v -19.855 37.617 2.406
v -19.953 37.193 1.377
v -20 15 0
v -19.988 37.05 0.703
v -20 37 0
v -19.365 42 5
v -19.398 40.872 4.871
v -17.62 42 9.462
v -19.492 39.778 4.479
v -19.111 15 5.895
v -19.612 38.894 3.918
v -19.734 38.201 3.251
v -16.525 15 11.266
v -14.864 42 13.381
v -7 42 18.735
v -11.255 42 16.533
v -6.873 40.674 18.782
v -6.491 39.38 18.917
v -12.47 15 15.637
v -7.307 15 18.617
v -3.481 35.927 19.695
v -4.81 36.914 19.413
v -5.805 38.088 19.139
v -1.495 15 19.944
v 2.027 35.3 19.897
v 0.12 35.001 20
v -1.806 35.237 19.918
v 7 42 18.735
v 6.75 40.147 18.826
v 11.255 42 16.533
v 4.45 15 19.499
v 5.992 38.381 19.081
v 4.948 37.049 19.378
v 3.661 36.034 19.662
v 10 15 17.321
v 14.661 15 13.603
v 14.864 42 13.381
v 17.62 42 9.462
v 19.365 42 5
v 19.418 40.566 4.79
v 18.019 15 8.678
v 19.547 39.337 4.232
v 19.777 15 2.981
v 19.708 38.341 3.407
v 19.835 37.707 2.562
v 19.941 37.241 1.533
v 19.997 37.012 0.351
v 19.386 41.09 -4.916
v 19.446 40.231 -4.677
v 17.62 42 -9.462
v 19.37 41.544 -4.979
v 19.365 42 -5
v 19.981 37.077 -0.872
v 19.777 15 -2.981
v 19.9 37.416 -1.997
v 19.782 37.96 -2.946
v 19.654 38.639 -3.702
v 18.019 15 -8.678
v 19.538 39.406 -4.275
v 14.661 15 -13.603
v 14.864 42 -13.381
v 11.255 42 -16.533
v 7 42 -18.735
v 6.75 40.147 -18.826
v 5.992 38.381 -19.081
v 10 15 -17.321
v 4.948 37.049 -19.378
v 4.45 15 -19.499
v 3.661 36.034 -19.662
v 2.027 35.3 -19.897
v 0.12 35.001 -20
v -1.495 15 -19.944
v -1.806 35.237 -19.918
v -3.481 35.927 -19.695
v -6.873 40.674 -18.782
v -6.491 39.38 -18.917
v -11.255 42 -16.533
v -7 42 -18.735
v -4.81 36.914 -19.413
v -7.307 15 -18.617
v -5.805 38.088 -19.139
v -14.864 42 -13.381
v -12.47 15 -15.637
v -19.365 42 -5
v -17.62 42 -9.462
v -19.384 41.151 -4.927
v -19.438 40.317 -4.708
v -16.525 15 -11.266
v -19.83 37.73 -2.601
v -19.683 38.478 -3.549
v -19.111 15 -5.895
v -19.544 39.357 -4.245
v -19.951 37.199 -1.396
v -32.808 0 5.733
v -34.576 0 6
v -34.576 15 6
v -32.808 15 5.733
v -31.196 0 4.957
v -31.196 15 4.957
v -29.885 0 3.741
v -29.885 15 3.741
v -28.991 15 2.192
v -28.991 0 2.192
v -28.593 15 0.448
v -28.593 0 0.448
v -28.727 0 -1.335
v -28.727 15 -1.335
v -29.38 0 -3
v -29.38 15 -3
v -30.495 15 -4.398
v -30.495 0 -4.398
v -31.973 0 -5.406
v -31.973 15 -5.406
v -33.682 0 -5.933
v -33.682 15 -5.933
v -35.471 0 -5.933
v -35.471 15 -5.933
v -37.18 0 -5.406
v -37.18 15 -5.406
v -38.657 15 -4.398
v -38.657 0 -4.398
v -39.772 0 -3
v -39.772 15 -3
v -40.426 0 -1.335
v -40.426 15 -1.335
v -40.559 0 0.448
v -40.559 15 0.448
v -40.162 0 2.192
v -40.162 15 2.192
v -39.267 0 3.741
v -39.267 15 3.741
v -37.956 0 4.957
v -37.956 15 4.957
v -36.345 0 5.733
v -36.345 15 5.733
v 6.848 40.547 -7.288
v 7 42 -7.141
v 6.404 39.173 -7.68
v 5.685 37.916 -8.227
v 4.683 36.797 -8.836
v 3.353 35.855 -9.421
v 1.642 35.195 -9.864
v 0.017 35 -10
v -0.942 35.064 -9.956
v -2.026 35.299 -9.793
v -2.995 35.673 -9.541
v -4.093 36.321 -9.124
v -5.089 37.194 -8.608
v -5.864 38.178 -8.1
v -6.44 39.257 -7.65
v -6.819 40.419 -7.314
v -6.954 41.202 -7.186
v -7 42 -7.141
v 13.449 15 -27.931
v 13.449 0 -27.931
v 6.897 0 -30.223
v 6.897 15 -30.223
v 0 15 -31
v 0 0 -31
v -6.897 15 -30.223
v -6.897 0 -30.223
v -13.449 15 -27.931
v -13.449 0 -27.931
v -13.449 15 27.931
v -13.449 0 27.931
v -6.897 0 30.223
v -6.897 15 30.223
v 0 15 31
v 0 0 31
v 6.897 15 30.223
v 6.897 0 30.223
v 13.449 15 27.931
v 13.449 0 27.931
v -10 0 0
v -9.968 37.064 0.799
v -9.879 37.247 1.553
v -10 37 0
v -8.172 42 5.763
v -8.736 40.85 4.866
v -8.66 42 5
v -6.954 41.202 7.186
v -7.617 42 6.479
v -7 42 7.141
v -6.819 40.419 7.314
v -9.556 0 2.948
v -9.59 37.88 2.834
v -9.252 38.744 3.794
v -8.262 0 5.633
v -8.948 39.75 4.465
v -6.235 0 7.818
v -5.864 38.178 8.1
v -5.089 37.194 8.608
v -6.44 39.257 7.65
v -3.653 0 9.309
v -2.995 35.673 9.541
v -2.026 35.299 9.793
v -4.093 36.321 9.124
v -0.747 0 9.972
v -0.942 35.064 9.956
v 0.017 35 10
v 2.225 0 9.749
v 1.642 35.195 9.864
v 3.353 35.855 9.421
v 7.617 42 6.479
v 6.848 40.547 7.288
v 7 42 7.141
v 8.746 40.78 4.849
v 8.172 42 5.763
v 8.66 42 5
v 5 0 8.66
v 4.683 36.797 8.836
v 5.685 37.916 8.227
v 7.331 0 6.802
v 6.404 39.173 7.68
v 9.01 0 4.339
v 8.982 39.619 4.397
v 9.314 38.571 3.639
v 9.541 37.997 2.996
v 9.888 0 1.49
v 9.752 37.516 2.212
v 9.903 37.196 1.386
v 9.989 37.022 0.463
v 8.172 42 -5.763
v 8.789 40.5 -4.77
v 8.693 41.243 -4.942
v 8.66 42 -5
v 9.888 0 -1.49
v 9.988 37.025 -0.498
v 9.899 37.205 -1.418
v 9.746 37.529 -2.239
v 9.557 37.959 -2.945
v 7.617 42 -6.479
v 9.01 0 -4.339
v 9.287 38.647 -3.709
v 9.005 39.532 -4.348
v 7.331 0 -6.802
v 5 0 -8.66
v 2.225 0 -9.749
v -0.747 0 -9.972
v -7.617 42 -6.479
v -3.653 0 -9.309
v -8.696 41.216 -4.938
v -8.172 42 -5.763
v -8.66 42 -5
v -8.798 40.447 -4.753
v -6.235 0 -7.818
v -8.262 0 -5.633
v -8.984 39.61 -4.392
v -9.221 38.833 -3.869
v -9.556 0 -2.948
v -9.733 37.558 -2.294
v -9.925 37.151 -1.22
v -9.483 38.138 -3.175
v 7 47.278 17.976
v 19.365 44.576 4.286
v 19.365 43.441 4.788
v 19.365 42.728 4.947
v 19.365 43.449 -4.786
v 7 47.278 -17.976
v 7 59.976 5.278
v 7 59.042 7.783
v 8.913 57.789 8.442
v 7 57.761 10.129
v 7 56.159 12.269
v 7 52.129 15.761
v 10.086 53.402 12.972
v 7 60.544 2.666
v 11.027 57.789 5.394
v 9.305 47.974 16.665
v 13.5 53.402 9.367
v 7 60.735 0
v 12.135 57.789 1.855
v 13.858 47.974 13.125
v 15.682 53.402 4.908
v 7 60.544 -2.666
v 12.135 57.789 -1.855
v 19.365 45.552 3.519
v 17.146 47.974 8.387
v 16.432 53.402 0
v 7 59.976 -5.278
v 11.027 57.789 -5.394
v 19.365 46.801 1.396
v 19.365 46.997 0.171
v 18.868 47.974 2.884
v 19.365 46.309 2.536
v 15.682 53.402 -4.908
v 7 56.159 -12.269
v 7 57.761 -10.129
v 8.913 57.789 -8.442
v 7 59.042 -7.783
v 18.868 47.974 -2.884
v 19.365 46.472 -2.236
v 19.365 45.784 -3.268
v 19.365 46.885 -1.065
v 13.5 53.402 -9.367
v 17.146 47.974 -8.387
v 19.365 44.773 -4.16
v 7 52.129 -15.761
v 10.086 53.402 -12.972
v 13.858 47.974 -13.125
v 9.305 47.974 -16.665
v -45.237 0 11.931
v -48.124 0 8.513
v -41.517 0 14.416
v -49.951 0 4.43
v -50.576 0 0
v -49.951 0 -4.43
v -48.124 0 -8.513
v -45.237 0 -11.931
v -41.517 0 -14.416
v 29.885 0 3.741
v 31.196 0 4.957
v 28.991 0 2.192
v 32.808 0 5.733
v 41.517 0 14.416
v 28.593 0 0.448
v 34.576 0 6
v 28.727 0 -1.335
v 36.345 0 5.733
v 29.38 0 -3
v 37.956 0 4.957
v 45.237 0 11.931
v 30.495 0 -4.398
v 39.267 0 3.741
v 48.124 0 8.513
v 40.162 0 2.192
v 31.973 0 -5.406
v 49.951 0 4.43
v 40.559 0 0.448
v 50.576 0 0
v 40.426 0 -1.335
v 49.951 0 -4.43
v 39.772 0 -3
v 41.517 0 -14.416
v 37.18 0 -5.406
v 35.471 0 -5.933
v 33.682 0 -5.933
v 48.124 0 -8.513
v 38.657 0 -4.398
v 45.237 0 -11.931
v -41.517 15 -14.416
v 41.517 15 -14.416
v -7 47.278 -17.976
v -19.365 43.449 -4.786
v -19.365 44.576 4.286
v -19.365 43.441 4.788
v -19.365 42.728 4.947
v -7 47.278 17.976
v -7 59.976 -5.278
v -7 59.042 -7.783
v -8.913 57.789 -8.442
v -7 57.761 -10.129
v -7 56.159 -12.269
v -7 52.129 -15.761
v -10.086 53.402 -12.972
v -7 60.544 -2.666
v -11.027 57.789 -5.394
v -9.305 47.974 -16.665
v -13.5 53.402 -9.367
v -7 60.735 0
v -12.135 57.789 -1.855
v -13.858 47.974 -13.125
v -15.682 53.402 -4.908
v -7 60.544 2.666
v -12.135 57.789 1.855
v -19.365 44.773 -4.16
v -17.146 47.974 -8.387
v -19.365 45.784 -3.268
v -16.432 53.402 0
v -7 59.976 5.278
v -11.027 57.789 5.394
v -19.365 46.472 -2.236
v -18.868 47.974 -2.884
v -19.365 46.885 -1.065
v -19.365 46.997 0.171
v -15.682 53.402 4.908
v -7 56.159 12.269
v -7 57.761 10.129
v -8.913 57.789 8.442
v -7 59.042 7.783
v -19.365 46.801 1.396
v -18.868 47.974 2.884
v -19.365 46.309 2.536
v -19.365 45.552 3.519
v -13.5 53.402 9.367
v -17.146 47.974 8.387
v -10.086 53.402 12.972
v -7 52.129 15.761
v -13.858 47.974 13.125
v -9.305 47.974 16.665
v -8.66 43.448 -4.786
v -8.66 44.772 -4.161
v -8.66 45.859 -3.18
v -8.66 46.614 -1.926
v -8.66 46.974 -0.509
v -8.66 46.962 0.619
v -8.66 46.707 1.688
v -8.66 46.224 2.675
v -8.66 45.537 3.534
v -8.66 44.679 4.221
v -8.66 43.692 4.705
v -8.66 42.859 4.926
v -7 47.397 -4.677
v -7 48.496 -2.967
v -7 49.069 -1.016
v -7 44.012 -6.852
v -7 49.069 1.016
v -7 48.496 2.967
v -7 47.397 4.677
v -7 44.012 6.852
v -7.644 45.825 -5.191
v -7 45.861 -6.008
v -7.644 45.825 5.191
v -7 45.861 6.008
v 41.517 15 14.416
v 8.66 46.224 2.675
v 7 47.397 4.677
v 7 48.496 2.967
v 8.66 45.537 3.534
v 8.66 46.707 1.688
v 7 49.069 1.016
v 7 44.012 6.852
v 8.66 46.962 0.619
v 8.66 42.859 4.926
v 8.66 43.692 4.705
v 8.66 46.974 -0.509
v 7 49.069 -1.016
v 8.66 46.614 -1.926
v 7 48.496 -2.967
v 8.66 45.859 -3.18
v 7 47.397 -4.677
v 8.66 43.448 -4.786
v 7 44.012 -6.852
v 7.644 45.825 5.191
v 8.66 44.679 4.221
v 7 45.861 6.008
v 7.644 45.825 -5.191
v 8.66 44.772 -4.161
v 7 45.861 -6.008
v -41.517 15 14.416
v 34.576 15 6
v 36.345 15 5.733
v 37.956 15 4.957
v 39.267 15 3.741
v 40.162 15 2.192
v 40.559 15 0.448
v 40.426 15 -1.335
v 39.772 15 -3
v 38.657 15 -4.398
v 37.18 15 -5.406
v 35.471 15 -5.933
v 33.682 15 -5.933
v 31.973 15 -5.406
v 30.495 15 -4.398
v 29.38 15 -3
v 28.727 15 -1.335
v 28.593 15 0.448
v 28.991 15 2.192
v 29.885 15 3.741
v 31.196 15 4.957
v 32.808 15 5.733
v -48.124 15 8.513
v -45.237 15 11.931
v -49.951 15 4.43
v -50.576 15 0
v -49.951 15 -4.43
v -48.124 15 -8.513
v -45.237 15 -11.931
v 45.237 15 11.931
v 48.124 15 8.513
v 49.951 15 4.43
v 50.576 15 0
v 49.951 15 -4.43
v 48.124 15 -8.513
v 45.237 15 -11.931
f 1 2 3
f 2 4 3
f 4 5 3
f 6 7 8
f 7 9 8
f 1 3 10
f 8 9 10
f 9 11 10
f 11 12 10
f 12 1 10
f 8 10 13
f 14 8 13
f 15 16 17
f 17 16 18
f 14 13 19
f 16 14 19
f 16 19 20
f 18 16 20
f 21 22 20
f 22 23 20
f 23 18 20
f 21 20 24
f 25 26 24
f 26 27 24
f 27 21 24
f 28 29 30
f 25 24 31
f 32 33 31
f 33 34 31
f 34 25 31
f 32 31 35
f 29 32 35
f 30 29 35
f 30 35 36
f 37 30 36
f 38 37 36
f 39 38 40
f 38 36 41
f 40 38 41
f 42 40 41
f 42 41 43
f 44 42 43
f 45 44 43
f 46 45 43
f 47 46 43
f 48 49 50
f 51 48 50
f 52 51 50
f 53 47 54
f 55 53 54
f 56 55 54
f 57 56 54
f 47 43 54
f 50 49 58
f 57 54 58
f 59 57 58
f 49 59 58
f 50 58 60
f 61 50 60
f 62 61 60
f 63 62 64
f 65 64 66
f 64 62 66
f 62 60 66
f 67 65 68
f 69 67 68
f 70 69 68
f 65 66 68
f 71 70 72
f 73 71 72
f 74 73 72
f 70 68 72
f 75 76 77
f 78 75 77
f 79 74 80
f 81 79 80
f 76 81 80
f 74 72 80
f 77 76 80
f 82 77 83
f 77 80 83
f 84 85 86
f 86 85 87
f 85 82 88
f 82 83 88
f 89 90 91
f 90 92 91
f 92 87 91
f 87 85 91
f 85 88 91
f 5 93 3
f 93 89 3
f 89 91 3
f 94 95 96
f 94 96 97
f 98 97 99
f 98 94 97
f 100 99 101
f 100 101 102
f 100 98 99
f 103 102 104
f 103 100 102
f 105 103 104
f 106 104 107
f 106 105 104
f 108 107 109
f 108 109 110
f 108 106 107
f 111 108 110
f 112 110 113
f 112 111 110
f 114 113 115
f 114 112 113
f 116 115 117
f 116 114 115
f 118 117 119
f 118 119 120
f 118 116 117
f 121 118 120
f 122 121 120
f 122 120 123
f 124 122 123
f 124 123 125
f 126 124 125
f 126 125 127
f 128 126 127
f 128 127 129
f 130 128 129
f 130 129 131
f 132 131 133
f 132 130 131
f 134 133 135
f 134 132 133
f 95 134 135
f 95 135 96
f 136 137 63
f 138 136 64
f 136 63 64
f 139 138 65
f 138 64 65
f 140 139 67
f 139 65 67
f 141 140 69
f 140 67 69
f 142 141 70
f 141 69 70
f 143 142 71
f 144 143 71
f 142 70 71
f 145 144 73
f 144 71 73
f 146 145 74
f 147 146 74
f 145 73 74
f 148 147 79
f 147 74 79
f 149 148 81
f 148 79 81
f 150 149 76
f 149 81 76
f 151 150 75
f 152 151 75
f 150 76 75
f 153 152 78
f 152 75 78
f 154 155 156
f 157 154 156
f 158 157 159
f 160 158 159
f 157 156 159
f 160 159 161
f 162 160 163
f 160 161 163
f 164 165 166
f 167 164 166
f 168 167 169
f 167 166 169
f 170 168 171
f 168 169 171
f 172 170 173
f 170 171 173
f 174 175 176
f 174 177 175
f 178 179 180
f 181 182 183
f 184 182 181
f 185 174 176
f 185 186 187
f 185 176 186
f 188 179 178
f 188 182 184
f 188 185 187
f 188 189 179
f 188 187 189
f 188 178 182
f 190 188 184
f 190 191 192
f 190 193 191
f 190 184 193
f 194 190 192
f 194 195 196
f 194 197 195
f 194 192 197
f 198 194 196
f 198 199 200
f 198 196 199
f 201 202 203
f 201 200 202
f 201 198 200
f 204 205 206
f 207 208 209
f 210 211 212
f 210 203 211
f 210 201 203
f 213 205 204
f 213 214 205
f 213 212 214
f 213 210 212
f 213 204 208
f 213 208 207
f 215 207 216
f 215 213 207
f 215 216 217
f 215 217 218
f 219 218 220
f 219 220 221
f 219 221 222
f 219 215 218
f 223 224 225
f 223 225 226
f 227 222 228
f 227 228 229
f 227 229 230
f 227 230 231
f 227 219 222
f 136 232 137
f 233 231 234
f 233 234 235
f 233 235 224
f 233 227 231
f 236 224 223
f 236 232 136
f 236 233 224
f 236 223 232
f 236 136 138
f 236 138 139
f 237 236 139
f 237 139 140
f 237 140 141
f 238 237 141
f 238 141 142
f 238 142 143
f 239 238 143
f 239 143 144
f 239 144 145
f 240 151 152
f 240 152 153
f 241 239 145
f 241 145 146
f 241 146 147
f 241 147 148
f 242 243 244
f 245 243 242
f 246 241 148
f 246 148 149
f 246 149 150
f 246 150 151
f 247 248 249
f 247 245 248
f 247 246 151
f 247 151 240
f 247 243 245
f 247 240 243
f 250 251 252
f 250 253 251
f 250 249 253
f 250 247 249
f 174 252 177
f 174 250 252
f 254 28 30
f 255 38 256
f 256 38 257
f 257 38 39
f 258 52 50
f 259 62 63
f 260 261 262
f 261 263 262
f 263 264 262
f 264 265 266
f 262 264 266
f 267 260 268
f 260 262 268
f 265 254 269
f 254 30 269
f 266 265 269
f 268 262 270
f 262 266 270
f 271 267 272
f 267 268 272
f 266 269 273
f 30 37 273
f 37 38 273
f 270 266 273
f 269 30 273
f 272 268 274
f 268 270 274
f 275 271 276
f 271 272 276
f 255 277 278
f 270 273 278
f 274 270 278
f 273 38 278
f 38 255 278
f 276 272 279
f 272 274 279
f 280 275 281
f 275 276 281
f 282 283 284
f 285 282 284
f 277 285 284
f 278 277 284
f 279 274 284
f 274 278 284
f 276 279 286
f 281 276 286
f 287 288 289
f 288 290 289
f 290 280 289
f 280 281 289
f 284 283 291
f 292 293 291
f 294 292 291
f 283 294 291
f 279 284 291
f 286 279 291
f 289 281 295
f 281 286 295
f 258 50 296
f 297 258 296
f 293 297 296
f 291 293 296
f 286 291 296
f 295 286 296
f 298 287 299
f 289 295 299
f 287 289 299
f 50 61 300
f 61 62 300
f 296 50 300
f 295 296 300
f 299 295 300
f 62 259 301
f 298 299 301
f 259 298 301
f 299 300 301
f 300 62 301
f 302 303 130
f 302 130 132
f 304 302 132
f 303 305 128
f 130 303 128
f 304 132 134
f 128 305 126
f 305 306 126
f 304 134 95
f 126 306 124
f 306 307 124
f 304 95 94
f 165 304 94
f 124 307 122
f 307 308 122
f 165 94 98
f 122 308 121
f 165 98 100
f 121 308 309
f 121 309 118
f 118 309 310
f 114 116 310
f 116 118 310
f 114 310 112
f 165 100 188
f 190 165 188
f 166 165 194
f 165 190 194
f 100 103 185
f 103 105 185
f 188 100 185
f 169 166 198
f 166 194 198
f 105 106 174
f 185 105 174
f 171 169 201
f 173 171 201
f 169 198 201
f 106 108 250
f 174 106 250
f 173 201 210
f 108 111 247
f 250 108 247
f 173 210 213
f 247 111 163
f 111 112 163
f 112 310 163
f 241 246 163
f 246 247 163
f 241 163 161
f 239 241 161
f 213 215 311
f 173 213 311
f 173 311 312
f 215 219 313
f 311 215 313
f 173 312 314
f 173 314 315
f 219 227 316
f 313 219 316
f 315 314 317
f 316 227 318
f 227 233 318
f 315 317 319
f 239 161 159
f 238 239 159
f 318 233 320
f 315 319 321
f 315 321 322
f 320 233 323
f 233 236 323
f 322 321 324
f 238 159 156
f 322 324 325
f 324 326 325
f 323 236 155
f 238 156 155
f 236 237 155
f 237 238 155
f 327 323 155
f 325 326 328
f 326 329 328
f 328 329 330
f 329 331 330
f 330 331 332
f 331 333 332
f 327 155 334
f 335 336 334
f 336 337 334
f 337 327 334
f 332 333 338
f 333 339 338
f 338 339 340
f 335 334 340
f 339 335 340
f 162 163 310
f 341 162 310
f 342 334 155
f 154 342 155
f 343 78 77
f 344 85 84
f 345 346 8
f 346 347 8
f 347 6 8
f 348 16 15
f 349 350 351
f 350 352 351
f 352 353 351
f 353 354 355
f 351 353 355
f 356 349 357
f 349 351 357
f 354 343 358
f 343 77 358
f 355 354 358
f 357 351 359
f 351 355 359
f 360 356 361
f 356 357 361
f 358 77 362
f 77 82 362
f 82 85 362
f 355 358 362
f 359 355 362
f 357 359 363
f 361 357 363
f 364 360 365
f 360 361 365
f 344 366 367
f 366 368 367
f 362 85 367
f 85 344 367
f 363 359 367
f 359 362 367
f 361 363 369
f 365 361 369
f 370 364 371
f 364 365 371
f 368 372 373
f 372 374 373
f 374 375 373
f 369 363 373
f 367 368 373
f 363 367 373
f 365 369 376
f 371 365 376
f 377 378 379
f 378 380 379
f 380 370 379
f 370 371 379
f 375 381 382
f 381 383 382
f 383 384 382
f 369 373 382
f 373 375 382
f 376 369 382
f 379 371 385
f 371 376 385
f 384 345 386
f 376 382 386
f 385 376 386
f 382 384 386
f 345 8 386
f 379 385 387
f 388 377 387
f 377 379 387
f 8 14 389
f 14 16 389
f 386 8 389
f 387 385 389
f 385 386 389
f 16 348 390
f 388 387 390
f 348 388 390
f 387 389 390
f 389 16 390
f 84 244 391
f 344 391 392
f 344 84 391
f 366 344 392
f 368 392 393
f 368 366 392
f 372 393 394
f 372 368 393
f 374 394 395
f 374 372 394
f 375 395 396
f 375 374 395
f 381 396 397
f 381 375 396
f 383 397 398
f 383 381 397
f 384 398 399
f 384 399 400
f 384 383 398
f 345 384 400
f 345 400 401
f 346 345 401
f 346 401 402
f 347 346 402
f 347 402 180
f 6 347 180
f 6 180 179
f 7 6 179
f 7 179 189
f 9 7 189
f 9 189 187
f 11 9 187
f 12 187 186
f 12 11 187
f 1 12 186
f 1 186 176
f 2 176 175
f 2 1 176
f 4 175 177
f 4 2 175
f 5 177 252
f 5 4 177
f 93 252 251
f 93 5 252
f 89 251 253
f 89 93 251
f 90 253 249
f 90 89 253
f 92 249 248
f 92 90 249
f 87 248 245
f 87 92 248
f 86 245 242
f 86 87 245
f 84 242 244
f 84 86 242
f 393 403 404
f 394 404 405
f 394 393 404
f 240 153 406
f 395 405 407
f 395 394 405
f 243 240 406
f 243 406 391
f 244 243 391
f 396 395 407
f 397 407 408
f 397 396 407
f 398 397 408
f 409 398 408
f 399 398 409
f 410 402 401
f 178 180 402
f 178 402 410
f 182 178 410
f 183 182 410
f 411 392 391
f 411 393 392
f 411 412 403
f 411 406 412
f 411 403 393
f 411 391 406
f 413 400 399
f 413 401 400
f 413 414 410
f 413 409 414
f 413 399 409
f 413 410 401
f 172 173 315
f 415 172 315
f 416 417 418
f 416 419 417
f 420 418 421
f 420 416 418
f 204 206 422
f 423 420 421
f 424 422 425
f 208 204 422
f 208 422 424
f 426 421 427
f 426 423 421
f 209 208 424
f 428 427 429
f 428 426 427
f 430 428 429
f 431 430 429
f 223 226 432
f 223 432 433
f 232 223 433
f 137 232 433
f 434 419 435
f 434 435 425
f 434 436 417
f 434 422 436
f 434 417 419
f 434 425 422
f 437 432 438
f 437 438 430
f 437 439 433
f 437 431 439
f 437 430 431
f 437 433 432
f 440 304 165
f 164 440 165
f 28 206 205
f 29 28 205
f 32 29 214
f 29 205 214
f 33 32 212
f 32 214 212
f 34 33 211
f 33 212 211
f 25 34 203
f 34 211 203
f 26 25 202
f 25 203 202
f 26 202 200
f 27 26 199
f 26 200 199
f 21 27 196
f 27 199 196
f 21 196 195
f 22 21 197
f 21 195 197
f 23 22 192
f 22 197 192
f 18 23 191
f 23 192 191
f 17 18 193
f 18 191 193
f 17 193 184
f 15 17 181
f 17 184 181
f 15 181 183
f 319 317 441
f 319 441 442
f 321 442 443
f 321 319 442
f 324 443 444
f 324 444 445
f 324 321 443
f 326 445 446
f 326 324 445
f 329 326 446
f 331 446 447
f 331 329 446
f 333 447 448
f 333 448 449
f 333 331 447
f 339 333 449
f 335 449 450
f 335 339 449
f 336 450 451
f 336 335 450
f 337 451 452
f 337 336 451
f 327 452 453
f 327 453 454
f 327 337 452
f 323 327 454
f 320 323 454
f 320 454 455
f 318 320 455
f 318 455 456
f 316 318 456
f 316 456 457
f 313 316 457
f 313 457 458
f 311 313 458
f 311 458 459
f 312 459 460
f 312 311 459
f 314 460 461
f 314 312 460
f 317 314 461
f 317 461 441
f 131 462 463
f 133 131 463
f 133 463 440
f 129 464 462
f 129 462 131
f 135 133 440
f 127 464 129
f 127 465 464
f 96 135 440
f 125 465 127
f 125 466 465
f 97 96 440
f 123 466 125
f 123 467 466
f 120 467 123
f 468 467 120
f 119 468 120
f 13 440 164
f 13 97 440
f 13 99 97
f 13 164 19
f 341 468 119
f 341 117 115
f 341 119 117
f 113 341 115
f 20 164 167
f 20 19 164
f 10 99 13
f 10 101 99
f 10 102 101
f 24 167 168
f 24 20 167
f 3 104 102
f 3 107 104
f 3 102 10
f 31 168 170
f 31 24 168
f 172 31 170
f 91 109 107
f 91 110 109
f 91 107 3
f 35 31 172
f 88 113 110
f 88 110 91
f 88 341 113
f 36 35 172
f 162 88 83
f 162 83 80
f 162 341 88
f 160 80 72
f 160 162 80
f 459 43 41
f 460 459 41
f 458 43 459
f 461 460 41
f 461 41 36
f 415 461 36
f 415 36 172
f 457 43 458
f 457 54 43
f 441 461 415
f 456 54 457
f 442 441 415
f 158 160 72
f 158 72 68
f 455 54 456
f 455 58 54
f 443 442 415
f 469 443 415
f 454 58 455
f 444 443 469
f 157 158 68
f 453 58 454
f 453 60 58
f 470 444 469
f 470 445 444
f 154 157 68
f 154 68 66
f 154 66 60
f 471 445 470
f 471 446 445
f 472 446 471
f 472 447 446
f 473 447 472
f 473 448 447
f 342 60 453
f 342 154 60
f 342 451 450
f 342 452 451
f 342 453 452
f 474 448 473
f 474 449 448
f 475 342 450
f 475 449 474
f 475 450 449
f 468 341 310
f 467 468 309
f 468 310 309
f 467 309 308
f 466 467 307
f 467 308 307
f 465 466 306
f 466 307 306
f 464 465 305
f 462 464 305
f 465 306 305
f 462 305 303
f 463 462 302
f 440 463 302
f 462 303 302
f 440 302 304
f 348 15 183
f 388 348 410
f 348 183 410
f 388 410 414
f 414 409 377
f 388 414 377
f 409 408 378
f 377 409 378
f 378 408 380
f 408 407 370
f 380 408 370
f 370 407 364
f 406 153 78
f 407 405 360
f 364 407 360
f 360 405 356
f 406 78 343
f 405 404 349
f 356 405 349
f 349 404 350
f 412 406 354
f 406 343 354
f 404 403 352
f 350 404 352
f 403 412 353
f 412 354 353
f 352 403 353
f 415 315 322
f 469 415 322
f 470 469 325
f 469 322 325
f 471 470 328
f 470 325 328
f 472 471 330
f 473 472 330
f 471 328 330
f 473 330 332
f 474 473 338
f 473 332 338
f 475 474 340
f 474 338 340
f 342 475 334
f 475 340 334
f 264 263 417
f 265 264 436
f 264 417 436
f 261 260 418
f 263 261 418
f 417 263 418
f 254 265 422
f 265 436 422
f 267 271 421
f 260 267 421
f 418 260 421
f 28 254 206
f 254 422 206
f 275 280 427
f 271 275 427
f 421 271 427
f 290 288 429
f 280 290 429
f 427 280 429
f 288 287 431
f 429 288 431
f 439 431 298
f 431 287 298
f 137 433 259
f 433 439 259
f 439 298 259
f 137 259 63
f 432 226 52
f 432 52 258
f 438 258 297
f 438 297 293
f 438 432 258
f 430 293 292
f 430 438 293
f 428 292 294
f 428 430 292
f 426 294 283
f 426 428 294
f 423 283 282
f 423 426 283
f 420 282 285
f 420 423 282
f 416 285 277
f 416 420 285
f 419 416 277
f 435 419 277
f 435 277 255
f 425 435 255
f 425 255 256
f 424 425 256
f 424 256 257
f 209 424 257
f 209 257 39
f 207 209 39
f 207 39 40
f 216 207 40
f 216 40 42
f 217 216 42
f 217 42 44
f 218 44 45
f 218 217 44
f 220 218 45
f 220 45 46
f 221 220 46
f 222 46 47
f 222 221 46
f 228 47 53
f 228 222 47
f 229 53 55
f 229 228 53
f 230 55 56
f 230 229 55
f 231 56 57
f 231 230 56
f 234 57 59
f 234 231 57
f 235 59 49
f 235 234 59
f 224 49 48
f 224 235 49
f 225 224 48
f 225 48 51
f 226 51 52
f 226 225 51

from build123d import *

# Parameters (mm, degrees)
SKETCH1_R               = 6.000000000045659
SKETCH1_R_2             = 6.000000000000002
BOSS_EXTRUDE3_DEPTH     = 15
CUT_EXTRUDE1_DEPTH      = 86.80768734285536
CUT_EXTRUDE1_DEPTH_BACK = 86.80768734285536
CUT_EXTRUDE2_DEPTH      = 85.89816666292398
CUT_EXTRUDE2_DEPTH_BACK = 85.89816666292398
SKETCH8_R               = 4.999999999999999


with BuildPart() as part:
    # Sketch1 → Boss-Extrude3 (new body)
    with BuildSketch(Plane(origin=(0, 0, 0), x_dir=(1, 0, 0), z_dir=(0, 1, 0))):
        with BuildLine():
            Line((13.448529411746133, -27.930933687605208), (41.51744765706708, -14.415965774247848))
            ThreePointArc((41.51744765706708, -14.415965774247848), (50.57627118648844, 3.55e-15), (41.51744765706708, 14.415965774247855))
            Line((41.51744765706708, 14.415965774247855), (13.448529411746131, 27.930933687605208))
            ThreePointArc((13.448529411746131, 27.930933687605208), (1.9e-15, 31.000000000000004), (-13.448529411746135, 27.930933687605208))
            Line((-13.448529411746135, 27.930933687605208), (-41.51744765706708, 14.415965774247852))
            ThreePointArc((-41.51744765706708, 14.415965774247852), (-50.576271186488434, 1.96e-15), (-41.51744765706708, -14.415965774247852))
            Line((-41.51744765706708, -14.415965774247852), (-13.448529411746136, -27.93093368760521))
            ThreePointArc((-13.448529411746136, -27.93093368760521), (1.9e-15, -31.000000000000007), (13.448529411746133, -27.930933687605208))
        make_face()
        with Locations(Location((-34.57627118648843, 0, 0), (0, 0, 270))):
            Circle(SKETCH1_R, mode=Mode.SUBTRACT)
        with Locations(Location((34.57627118648844, 0, 0), (0, 0, 270))):
            Circle(SKETCH1_R_2, mode=Mode.SUBTRACT)
    extrude(amount=BOSS_EXTRUDE3_DEPTH)

    # Sketch5 → Revolve1 (revolve)
    with BuildSketch(Plane.XY):
        with BuildLine():
            Line((0, 0), (0, 42))
            Line((0, 42), (-6.983e-14, 62.00000000000001))
            ThreePointArc((-6.983e-14, 62.00000000000001), (-14.14213562373098, 56.14213562373093), (-20, 42))
            Line((-20, 42), (-19.999999999999996, 0))
            Line((-19.999999999999996, 0), (0, 0))
        make_face()
    revolve(axis=Axis((0, 0, 0), (0, 1, 0)))

    # Sketch6 → Cut-Revolve1 (revolve, cut)
    with BuildSketch(Plane.XY):
        with BuildLine():
            Line((-1.73e-15, 0), (0, 42))
            Line((0, 42), (0, 52.00000000000001))
            ThreePointArc((0, 52.00000000000001), (-7.07106781186548, 49.07106781186548), (-9.999999999999998, 42))
            Line((-9.999999999999998, 42), (-9.999999999999995, 2.1e-16))
            Line((-9.999999999999995, 2.1e-16), (-1.73e-15, 0))
        make_face()
    revolve(axis=Axis((-1.73e-15, 0, 0), (4e-17, 1, 0)), mode=Mode.SUBTRACT)

    # Sketch7 → Cut-Extrude1 (cut, two sides: drawn at the far end of the back side and taken through both)
    with BuildSketch(Plane.XY.offset(-CUT_EXTRUDE1_DEPTH_BACK)):
        with BuildLine():
            Line((-6.999999999999999, 42), (-6.999999999999999, 60.734993995195204))
            ThreePointArc((-6.999999999999999, 60.734993995195204), (1.22e-15, 62.00000000000001), (6.999999999999999, 60.734993995195204))
            Line((6.999999999999999, 60.734993995195204), (6.999999999999999, 42))
            ThreePointArc((6.999999999999999, 42), (-1.29e-15, 35), (-6.999999999999999, 42))
        make_face()
    extrude(amount=CUT_EXTRUDE1_DEPTH + CUT_EXTRUDE1_DEPTH_BACK, mode=Mode.SUBTRACT)

    # Sketch8 → Cut-Extrude2 (cut, two sides: drawn at the far end of the back side and taken through both)
    with BuildSketch(Plane(origin=(0, 0, 0), x_dir=(0, 0, -1), z_dir=(1, 0, 0)).offset(-CUT_EXTRUDE2_DEPTH_BACK)):
        with Locations((3.47e-15, 42)):
            Circle(SKETCH8_R)
    extrude(amount=CUT_EXTRUDE2_DEPTH + CUT_EXTRUDE2_DEPTH_BACK, mode=Mode.SUBTRACT)


solid = part.part
